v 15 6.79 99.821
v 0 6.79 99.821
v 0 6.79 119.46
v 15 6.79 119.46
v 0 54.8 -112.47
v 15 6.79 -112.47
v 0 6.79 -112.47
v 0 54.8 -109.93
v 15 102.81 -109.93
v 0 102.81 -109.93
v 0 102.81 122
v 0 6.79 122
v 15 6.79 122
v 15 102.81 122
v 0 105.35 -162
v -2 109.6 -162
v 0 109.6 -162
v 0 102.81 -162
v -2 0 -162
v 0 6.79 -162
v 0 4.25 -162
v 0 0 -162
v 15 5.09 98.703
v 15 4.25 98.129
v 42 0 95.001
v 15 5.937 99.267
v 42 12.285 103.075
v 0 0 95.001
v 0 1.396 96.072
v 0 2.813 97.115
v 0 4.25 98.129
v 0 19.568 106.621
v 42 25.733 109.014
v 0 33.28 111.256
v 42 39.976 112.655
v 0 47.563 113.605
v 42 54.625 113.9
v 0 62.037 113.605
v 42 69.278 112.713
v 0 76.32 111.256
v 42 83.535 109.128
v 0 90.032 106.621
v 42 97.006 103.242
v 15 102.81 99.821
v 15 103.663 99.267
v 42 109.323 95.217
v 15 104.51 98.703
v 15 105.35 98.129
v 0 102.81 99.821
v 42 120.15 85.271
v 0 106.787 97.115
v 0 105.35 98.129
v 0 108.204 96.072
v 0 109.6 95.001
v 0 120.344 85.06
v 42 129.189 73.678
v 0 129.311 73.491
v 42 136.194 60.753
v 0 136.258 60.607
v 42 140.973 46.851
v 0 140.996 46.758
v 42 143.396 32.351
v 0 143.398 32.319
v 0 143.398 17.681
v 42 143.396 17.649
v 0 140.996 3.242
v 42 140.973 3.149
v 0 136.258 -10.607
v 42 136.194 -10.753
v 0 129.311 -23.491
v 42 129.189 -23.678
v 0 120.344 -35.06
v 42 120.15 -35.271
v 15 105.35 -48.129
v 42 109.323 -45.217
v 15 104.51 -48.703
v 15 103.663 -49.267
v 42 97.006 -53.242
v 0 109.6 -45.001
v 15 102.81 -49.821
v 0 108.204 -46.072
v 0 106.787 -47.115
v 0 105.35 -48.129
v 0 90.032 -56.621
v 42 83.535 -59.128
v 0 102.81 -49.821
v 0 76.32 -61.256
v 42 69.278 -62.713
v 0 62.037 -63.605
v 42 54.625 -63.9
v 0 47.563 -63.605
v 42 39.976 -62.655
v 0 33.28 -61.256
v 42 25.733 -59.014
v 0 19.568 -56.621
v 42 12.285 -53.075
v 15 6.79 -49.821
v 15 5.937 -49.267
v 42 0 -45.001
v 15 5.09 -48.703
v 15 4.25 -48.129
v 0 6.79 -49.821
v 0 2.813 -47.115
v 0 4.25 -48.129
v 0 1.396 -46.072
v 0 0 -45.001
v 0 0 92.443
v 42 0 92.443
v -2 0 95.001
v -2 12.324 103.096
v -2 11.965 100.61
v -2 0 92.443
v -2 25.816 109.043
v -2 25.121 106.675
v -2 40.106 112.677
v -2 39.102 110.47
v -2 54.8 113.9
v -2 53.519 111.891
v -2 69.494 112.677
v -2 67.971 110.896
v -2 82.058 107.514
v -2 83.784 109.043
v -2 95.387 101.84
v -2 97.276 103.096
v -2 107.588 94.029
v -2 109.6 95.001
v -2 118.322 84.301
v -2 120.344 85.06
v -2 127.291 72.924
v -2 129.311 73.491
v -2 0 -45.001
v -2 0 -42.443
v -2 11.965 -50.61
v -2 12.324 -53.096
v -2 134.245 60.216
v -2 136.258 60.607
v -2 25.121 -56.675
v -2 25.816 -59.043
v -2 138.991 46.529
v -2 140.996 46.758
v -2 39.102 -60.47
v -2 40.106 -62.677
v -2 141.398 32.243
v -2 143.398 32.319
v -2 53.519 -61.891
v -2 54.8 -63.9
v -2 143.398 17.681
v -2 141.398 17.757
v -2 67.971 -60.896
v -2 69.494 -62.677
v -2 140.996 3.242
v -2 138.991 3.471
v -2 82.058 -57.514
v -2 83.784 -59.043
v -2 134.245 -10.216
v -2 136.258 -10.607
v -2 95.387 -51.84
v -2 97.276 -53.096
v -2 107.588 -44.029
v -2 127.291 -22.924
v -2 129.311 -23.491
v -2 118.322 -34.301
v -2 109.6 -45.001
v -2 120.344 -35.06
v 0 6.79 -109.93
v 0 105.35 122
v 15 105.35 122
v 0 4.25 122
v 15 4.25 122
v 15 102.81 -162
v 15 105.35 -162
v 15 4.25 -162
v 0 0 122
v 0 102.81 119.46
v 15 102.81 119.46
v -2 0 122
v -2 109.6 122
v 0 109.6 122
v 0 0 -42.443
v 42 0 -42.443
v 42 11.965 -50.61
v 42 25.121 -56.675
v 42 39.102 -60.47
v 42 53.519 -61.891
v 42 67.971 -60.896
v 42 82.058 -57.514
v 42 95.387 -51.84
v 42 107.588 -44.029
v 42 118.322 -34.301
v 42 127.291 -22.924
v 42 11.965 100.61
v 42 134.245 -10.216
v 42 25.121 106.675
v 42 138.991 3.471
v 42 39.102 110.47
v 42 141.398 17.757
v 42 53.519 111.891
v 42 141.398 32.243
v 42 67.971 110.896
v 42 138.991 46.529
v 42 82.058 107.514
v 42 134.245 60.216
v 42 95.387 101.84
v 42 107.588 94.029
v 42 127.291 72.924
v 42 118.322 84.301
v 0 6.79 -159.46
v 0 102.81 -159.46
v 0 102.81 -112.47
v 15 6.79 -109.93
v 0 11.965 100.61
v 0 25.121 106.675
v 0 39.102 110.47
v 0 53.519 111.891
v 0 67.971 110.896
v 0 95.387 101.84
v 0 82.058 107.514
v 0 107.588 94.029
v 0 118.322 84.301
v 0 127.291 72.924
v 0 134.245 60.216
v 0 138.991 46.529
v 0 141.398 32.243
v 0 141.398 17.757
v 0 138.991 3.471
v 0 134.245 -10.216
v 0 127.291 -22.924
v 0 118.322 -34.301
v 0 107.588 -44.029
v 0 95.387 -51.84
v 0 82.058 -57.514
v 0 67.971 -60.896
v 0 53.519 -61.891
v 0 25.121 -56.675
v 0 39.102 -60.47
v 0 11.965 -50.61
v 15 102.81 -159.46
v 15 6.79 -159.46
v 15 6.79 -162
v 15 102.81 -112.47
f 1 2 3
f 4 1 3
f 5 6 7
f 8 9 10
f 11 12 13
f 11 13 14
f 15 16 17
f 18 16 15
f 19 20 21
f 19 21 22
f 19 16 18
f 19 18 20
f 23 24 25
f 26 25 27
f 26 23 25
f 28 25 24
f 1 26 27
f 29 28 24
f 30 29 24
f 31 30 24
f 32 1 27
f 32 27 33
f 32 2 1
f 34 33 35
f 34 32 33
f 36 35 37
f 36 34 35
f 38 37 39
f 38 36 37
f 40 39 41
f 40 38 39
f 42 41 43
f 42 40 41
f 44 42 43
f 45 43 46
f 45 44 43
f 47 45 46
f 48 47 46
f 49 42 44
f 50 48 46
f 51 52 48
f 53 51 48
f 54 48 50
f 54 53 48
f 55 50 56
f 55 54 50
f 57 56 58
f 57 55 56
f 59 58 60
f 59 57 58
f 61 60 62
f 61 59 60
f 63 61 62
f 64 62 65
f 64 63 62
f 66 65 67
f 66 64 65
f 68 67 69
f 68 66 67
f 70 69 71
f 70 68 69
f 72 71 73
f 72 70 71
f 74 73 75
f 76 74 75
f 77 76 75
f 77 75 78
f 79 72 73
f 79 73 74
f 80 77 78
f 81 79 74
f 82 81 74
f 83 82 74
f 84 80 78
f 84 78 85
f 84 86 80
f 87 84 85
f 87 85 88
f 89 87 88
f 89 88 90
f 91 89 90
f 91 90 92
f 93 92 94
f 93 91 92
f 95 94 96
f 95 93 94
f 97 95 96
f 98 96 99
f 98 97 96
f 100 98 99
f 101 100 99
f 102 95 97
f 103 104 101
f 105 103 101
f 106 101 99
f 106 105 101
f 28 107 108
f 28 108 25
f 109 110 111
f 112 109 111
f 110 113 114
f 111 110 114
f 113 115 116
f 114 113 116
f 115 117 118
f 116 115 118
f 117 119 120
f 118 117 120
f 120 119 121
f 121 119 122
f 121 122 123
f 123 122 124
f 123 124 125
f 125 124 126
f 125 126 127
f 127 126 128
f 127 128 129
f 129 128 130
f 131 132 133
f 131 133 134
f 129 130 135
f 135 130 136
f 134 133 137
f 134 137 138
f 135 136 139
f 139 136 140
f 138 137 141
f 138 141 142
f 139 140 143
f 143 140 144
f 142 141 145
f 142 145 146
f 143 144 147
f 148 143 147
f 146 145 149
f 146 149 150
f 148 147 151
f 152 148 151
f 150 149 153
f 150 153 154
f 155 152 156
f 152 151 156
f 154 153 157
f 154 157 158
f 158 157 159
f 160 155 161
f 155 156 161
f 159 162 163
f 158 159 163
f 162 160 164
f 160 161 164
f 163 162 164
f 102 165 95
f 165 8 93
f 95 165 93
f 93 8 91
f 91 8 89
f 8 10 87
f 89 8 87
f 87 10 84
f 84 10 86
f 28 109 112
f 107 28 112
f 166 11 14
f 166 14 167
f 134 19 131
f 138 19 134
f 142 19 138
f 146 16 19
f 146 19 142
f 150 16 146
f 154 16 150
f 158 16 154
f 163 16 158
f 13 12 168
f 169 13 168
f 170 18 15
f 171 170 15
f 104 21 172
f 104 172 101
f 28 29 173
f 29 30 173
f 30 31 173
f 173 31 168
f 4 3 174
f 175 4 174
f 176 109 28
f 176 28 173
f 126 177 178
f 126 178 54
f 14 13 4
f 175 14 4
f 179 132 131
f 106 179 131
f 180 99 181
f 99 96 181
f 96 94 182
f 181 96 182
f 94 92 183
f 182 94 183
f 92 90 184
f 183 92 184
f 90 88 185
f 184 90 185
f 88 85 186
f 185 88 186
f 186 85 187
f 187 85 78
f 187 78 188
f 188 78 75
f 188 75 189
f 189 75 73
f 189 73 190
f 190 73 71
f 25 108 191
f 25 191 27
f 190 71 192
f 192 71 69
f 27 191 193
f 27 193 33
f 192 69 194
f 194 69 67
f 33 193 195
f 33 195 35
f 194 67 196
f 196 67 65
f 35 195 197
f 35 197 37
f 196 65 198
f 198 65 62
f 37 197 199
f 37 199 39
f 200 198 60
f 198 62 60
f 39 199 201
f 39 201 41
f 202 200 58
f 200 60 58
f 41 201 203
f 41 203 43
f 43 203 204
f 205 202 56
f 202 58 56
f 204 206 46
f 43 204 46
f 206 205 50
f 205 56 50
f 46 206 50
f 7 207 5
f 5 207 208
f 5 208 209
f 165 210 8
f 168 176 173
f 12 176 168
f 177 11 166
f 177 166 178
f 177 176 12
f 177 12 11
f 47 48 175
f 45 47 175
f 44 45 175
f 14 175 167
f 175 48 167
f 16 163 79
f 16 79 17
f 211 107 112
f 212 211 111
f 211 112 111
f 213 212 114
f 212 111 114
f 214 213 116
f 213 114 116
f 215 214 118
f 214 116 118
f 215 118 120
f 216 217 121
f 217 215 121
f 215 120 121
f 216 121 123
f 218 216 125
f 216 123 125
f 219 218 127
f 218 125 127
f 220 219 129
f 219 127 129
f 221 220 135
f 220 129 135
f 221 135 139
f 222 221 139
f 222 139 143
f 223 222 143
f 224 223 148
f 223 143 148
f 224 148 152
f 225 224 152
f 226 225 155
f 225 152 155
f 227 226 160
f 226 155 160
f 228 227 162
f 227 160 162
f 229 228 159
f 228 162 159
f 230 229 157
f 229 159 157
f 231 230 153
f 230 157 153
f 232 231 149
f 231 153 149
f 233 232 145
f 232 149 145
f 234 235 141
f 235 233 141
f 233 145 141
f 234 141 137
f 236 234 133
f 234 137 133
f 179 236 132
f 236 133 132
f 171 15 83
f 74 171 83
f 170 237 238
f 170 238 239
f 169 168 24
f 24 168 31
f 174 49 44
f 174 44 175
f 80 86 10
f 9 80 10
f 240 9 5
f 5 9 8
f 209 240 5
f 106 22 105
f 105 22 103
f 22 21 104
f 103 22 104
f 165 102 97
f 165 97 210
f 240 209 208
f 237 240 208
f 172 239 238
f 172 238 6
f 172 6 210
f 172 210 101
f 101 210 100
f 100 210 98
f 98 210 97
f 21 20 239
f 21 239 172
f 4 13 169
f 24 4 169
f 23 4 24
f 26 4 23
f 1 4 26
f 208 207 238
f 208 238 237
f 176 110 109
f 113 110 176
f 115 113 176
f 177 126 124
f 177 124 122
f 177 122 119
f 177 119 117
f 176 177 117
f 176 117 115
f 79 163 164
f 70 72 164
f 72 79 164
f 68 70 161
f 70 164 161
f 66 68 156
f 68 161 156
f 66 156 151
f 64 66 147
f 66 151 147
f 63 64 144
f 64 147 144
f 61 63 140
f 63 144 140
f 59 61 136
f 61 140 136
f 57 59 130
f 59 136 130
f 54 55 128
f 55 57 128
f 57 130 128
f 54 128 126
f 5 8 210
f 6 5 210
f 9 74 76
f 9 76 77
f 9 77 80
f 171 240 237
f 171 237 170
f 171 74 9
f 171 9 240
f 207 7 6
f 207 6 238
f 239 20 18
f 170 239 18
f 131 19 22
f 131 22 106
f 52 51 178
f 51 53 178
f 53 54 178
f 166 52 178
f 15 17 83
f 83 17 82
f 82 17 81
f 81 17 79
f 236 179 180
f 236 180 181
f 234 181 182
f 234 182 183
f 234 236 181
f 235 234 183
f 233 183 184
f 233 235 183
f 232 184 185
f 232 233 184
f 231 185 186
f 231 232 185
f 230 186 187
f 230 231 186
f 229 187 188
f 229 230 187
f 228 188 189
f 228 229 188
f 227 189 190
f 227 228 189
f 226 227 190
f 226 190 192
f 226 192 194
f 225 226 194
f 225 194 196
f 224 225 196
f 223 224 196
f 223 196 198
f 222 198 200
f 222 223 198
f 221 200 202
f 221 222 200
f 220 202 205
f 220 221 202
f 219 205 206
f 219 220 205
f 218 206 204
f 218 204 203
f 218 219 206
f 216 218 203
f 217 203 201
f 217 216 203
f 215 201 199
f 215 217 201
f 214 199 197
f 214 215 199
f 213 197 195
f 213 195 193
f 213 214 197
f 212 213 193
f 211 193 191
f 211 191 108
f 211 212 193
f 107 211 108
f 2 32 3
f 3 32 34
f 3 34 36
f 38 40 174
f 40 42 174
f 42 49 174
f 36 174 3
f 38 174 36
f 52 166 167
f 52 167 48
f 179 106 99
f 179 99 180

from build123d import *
from build123d.topology import SkipClean

# Parameters (mm, degrees)
BOSS_EXTRUDE1_DEPTH = 42.000000074
BOSS_EXTRUDE2_START = 2.000000064
BOSS_EXTRUDE2_DEPTH = 2.000000064
BOSS_EXTRUDE3_DEPTH = 15
BOSS_EXTRUDE4_DEPTH = 15
BOSS_EXTRUDE5_DEPTH = 15
BOSS_EXTRUDE6_DEPTH = 15
RIB1_START          = -1.27
RIB1_DEPTH          = 2.54
RIB2_START          = -1.27
RIB2_DEPTH          = 2.54
SKETCH18_W          = 2.54
SKETCH18_H          = 96.020000238
BOSS_EXTRUDE7_DEPTH = 15
SKETCH19_W          = 2.54
SKETCH19_H          = 96.020000238
BOSS_EXTRUDE8_DEPTH = 15


# Read off the part's stored shape, not the designer's step: Rib1, Rib2
with BuildPart() as part:
    # Sketch1 → Boss-Extrude1 (new body)
    with BuildSketch(Plane.ZY):
        with BuildLine():
            Line((-45.001214275, 0), (-42.443087035, 0))
            ThreePointArc((-42.443087035, 0), (25, 141.699999936), (92.443087035, 0))
            Line((92.443087035, 0), (95.001214275, 0))
            ThreePointArc((95.001214275, 0), (25, 143.7), (-45.001214275, 0))
        make_face()
    extrude(amount=-BOSS_EXTRUDE1_DEPTH)

    # Sketch2 → Boss-Extrude2 (add)
    with SkipClean():  # the faces are left unmerged after this step: merging them gives an invalid solid
        with BuildSketch(Plane.ZY.offset(BOSS_EXTRUDE2_START)):
            with BuildLine():
                Line((-160, 0), (-45.001214275, 0))
                ThreePointArc((-45.001214275, 0), (-63.9, 54.800000001), (-45.001214274, 109.600000001))
                Line((-45.001214275, 109.600000002), (-160, 109.600000002))
                Line((-160, 109.600000002), (-162.000000064, 109.600000002))
                Line((-162.000000064, 109.600000002), (-162.000000064, 0))
                Line((-162.000000064, 0), (-160, 0))
            make_face()
            with BuildLine():
                ThreePointArc((-45.001214275, 0), (25, 143.7), (95.001214275, 0))
                Line((95.001214275, 0), (92.443087035, 0))
                ThreePointArc((92.443087035, 0), (25, 141.699999936), (-42.443087035, 0))
                Line((-42.443087035, 0), (-45.001214275, 0))
            make_face()
            with BuildLine():
                ThreePointArc((95.001214275, 109.6), (113.9, 54.8), (95.001214275, 0))
                Line((95.001214275, 0), (120, 0))
                Line((120, 0), (122.000000064, 0))
                Line((122.000000064, 0), (122.000000064, 109.6))
                Line((122.000000064, 109.6), (120, 109.6))
                Line((120, 109.6), (95.001214275, 109.6))
            make_face()
        extrude(amount=-BOSS_EXTRUDE2_DEPTH)

    # Sketch7 → Boss-Extrude3 (add)
    with SkipClean():  # the faces are left unmerged after this step: merging them gives an invalid solid
        with BuildSketch(Plane(origin=(0, 0, 0), x_dir=(0, 0, -1), z_dir=(1, 0, 0))):
            with BuildLine():
                Line((49.821453399, 6.789999882), (162.000000064, 6.789999882))
                Line((162.000000064, 6.789999882), (162.000000064, 4.249999882))
                Line((162.000000064, 4.249999882), (48.129388676, 4.249999882))
                ThreePointArc((48.129388676, 4.249999882), (48.986321828, 5.512738133), (49.821453399, 6.789999882))
            make_face()
        extrude(amount=BOSS_EXTRUDE3_DEPTH)

    # Sketch10 → Boss-Extrude4 (add)
    with SkipClean():  # the faces are left unmerged after this step: merging them gives an invalid solid
        with BuildSketch(Plane(origin=(0, 0, 0), x_dir=(0, 0, -1), z_dir=(1, 0, 0))):
            with BuildLine():
                Line((-99.821453399, 6.789999882), (-122.000000064, 6.789999882))
                Line((-122.000000064, 6.789999882), (-122.000000064, 4.249999882))
                Line((-122.000000064, 4.249999882), (-98.129388676, 4.249999882))
                ThreePointArc((-98.129388676, 4.249999882), (-98.986321828, 5.512738133), (-99.821453399, 6.789999882))
            make_face()
        extrude(amount=BOSS_EXTRUDE4_DEPTH)

    # Sketch12 → Boss-Extrude5 (add)
    with SkipClean():  # the faces are left unmerged after this step: merging them gives an invalid solid
        with BuildSketch(Plane(origin=(0, 0, 0), x_dir=(0, 0, -1), z_dir=(1, 0, 0))):
            with BuildLine():
                Line((-122.000000064, 105.35000012), (-98.129388674, 105.35000012))
                ThreePointArc((-98.129388674, 105.35000012), (-98.986321827, 104.087261869), (-99.821453397, 102.81000012))
                Line((-99.821453397, 102.81000012), (-122.000000064, 102.81000012))
                Line((-122.000000064, 102.81000012), (-122.000000064, 105.35000012))
            make_face()
        extrude(amount=BOSS_EXTRUDE5_DEPTH)

    # Sketch14 → Boss-Extrude6 (add)
    with SkipClean():  # the faces are left unmerged after this step: merging them gives an invalid solid
        with BuildSketch(Plane(origin=(0, 0, 0), x_dir=(0, 0, -1), z_dir=(1, 0, 0))):
            with BuildLine():
                Line((162.000000064, 105.35000012), (48.129388674, 105.35000012))
                ThreePointArc((48.129388674, 105.35000012), (48.986321827, 104.087261869), (49.821453397, 102.81000012))
                Line((49.821453397, 102.81000012), (162.000000064, 102.81000012))
                Line((162.000000064, 102.81000012), (162.000000064, 105.35000012))
            make_face()
        extrude(amount=BOSS_EXTRUDE6_DEPTH)

    # Rib1 outline → Rib1 (add)
    with SkipClean():  # the faces are left unmerged after this step: merging them gives an invalid solid
        with BuildSketch(Plane(origin=(0, 0, -111.200000064), x_dir=(-1, 0, 0), z_dir=(0, 0, -1)).offset(RIB1_START)):
            Polygon((0, 102.81000012), (-15, 102.81000012), (0, 54.800000001), align=None)
        extrude(amount=RIB1_DEPTH)

    # Rib2 outline → Rib2 (add)
    with SkipClean():  # the faces are left unmerged after this step: merging them gives an invalid solid
        with BuildSketch(Plane(origin=(0, 0, -111.200000064), x_dir=(-1, 0, 0), z_dir=(0, 0, -1)).offset(RIB2_START)):
            Polygon((0, 54.800000001), (-15, 6.789999882), (0, 6.789999882), align=None)
        extrude(amount=RIB2_DEPTH)

    # Sketch18 → Boss-Extrude7 (add)
    with SkipClean():  # the faces are left unmerged after this step: merging them gives an invalid solid
        with BuildSketch(Plane(origin=(0, 0, 0), x_dir=(0, 0, -1), z_dir=(1, 0, 0))):
            with Locations((160.730000064, 54.800000001)):
                Rectangle(SKETCH18_W, SKETCH18_H)
        extrude(amount=BOSS_EXTRUDE7_DEPTH)

    # Sketch19 → Boss-Extrude8 (add)
    with SkipClean():  # the faces are left unmerged after this step: merging them gives an invalid solid
        with BuildSketch(Plane(origin=(0, 0, 0), x_dir=(0, 0, -1), z_dir=(1, 0, 0))):
            with Locations((-120.730000064, 54.800000001)):
                Rectangle(SKETCH19_W, SKETCH19_H)
        extrude(amount=BOSS_EXTRUDE8_DEPTH)


solid = part.part
